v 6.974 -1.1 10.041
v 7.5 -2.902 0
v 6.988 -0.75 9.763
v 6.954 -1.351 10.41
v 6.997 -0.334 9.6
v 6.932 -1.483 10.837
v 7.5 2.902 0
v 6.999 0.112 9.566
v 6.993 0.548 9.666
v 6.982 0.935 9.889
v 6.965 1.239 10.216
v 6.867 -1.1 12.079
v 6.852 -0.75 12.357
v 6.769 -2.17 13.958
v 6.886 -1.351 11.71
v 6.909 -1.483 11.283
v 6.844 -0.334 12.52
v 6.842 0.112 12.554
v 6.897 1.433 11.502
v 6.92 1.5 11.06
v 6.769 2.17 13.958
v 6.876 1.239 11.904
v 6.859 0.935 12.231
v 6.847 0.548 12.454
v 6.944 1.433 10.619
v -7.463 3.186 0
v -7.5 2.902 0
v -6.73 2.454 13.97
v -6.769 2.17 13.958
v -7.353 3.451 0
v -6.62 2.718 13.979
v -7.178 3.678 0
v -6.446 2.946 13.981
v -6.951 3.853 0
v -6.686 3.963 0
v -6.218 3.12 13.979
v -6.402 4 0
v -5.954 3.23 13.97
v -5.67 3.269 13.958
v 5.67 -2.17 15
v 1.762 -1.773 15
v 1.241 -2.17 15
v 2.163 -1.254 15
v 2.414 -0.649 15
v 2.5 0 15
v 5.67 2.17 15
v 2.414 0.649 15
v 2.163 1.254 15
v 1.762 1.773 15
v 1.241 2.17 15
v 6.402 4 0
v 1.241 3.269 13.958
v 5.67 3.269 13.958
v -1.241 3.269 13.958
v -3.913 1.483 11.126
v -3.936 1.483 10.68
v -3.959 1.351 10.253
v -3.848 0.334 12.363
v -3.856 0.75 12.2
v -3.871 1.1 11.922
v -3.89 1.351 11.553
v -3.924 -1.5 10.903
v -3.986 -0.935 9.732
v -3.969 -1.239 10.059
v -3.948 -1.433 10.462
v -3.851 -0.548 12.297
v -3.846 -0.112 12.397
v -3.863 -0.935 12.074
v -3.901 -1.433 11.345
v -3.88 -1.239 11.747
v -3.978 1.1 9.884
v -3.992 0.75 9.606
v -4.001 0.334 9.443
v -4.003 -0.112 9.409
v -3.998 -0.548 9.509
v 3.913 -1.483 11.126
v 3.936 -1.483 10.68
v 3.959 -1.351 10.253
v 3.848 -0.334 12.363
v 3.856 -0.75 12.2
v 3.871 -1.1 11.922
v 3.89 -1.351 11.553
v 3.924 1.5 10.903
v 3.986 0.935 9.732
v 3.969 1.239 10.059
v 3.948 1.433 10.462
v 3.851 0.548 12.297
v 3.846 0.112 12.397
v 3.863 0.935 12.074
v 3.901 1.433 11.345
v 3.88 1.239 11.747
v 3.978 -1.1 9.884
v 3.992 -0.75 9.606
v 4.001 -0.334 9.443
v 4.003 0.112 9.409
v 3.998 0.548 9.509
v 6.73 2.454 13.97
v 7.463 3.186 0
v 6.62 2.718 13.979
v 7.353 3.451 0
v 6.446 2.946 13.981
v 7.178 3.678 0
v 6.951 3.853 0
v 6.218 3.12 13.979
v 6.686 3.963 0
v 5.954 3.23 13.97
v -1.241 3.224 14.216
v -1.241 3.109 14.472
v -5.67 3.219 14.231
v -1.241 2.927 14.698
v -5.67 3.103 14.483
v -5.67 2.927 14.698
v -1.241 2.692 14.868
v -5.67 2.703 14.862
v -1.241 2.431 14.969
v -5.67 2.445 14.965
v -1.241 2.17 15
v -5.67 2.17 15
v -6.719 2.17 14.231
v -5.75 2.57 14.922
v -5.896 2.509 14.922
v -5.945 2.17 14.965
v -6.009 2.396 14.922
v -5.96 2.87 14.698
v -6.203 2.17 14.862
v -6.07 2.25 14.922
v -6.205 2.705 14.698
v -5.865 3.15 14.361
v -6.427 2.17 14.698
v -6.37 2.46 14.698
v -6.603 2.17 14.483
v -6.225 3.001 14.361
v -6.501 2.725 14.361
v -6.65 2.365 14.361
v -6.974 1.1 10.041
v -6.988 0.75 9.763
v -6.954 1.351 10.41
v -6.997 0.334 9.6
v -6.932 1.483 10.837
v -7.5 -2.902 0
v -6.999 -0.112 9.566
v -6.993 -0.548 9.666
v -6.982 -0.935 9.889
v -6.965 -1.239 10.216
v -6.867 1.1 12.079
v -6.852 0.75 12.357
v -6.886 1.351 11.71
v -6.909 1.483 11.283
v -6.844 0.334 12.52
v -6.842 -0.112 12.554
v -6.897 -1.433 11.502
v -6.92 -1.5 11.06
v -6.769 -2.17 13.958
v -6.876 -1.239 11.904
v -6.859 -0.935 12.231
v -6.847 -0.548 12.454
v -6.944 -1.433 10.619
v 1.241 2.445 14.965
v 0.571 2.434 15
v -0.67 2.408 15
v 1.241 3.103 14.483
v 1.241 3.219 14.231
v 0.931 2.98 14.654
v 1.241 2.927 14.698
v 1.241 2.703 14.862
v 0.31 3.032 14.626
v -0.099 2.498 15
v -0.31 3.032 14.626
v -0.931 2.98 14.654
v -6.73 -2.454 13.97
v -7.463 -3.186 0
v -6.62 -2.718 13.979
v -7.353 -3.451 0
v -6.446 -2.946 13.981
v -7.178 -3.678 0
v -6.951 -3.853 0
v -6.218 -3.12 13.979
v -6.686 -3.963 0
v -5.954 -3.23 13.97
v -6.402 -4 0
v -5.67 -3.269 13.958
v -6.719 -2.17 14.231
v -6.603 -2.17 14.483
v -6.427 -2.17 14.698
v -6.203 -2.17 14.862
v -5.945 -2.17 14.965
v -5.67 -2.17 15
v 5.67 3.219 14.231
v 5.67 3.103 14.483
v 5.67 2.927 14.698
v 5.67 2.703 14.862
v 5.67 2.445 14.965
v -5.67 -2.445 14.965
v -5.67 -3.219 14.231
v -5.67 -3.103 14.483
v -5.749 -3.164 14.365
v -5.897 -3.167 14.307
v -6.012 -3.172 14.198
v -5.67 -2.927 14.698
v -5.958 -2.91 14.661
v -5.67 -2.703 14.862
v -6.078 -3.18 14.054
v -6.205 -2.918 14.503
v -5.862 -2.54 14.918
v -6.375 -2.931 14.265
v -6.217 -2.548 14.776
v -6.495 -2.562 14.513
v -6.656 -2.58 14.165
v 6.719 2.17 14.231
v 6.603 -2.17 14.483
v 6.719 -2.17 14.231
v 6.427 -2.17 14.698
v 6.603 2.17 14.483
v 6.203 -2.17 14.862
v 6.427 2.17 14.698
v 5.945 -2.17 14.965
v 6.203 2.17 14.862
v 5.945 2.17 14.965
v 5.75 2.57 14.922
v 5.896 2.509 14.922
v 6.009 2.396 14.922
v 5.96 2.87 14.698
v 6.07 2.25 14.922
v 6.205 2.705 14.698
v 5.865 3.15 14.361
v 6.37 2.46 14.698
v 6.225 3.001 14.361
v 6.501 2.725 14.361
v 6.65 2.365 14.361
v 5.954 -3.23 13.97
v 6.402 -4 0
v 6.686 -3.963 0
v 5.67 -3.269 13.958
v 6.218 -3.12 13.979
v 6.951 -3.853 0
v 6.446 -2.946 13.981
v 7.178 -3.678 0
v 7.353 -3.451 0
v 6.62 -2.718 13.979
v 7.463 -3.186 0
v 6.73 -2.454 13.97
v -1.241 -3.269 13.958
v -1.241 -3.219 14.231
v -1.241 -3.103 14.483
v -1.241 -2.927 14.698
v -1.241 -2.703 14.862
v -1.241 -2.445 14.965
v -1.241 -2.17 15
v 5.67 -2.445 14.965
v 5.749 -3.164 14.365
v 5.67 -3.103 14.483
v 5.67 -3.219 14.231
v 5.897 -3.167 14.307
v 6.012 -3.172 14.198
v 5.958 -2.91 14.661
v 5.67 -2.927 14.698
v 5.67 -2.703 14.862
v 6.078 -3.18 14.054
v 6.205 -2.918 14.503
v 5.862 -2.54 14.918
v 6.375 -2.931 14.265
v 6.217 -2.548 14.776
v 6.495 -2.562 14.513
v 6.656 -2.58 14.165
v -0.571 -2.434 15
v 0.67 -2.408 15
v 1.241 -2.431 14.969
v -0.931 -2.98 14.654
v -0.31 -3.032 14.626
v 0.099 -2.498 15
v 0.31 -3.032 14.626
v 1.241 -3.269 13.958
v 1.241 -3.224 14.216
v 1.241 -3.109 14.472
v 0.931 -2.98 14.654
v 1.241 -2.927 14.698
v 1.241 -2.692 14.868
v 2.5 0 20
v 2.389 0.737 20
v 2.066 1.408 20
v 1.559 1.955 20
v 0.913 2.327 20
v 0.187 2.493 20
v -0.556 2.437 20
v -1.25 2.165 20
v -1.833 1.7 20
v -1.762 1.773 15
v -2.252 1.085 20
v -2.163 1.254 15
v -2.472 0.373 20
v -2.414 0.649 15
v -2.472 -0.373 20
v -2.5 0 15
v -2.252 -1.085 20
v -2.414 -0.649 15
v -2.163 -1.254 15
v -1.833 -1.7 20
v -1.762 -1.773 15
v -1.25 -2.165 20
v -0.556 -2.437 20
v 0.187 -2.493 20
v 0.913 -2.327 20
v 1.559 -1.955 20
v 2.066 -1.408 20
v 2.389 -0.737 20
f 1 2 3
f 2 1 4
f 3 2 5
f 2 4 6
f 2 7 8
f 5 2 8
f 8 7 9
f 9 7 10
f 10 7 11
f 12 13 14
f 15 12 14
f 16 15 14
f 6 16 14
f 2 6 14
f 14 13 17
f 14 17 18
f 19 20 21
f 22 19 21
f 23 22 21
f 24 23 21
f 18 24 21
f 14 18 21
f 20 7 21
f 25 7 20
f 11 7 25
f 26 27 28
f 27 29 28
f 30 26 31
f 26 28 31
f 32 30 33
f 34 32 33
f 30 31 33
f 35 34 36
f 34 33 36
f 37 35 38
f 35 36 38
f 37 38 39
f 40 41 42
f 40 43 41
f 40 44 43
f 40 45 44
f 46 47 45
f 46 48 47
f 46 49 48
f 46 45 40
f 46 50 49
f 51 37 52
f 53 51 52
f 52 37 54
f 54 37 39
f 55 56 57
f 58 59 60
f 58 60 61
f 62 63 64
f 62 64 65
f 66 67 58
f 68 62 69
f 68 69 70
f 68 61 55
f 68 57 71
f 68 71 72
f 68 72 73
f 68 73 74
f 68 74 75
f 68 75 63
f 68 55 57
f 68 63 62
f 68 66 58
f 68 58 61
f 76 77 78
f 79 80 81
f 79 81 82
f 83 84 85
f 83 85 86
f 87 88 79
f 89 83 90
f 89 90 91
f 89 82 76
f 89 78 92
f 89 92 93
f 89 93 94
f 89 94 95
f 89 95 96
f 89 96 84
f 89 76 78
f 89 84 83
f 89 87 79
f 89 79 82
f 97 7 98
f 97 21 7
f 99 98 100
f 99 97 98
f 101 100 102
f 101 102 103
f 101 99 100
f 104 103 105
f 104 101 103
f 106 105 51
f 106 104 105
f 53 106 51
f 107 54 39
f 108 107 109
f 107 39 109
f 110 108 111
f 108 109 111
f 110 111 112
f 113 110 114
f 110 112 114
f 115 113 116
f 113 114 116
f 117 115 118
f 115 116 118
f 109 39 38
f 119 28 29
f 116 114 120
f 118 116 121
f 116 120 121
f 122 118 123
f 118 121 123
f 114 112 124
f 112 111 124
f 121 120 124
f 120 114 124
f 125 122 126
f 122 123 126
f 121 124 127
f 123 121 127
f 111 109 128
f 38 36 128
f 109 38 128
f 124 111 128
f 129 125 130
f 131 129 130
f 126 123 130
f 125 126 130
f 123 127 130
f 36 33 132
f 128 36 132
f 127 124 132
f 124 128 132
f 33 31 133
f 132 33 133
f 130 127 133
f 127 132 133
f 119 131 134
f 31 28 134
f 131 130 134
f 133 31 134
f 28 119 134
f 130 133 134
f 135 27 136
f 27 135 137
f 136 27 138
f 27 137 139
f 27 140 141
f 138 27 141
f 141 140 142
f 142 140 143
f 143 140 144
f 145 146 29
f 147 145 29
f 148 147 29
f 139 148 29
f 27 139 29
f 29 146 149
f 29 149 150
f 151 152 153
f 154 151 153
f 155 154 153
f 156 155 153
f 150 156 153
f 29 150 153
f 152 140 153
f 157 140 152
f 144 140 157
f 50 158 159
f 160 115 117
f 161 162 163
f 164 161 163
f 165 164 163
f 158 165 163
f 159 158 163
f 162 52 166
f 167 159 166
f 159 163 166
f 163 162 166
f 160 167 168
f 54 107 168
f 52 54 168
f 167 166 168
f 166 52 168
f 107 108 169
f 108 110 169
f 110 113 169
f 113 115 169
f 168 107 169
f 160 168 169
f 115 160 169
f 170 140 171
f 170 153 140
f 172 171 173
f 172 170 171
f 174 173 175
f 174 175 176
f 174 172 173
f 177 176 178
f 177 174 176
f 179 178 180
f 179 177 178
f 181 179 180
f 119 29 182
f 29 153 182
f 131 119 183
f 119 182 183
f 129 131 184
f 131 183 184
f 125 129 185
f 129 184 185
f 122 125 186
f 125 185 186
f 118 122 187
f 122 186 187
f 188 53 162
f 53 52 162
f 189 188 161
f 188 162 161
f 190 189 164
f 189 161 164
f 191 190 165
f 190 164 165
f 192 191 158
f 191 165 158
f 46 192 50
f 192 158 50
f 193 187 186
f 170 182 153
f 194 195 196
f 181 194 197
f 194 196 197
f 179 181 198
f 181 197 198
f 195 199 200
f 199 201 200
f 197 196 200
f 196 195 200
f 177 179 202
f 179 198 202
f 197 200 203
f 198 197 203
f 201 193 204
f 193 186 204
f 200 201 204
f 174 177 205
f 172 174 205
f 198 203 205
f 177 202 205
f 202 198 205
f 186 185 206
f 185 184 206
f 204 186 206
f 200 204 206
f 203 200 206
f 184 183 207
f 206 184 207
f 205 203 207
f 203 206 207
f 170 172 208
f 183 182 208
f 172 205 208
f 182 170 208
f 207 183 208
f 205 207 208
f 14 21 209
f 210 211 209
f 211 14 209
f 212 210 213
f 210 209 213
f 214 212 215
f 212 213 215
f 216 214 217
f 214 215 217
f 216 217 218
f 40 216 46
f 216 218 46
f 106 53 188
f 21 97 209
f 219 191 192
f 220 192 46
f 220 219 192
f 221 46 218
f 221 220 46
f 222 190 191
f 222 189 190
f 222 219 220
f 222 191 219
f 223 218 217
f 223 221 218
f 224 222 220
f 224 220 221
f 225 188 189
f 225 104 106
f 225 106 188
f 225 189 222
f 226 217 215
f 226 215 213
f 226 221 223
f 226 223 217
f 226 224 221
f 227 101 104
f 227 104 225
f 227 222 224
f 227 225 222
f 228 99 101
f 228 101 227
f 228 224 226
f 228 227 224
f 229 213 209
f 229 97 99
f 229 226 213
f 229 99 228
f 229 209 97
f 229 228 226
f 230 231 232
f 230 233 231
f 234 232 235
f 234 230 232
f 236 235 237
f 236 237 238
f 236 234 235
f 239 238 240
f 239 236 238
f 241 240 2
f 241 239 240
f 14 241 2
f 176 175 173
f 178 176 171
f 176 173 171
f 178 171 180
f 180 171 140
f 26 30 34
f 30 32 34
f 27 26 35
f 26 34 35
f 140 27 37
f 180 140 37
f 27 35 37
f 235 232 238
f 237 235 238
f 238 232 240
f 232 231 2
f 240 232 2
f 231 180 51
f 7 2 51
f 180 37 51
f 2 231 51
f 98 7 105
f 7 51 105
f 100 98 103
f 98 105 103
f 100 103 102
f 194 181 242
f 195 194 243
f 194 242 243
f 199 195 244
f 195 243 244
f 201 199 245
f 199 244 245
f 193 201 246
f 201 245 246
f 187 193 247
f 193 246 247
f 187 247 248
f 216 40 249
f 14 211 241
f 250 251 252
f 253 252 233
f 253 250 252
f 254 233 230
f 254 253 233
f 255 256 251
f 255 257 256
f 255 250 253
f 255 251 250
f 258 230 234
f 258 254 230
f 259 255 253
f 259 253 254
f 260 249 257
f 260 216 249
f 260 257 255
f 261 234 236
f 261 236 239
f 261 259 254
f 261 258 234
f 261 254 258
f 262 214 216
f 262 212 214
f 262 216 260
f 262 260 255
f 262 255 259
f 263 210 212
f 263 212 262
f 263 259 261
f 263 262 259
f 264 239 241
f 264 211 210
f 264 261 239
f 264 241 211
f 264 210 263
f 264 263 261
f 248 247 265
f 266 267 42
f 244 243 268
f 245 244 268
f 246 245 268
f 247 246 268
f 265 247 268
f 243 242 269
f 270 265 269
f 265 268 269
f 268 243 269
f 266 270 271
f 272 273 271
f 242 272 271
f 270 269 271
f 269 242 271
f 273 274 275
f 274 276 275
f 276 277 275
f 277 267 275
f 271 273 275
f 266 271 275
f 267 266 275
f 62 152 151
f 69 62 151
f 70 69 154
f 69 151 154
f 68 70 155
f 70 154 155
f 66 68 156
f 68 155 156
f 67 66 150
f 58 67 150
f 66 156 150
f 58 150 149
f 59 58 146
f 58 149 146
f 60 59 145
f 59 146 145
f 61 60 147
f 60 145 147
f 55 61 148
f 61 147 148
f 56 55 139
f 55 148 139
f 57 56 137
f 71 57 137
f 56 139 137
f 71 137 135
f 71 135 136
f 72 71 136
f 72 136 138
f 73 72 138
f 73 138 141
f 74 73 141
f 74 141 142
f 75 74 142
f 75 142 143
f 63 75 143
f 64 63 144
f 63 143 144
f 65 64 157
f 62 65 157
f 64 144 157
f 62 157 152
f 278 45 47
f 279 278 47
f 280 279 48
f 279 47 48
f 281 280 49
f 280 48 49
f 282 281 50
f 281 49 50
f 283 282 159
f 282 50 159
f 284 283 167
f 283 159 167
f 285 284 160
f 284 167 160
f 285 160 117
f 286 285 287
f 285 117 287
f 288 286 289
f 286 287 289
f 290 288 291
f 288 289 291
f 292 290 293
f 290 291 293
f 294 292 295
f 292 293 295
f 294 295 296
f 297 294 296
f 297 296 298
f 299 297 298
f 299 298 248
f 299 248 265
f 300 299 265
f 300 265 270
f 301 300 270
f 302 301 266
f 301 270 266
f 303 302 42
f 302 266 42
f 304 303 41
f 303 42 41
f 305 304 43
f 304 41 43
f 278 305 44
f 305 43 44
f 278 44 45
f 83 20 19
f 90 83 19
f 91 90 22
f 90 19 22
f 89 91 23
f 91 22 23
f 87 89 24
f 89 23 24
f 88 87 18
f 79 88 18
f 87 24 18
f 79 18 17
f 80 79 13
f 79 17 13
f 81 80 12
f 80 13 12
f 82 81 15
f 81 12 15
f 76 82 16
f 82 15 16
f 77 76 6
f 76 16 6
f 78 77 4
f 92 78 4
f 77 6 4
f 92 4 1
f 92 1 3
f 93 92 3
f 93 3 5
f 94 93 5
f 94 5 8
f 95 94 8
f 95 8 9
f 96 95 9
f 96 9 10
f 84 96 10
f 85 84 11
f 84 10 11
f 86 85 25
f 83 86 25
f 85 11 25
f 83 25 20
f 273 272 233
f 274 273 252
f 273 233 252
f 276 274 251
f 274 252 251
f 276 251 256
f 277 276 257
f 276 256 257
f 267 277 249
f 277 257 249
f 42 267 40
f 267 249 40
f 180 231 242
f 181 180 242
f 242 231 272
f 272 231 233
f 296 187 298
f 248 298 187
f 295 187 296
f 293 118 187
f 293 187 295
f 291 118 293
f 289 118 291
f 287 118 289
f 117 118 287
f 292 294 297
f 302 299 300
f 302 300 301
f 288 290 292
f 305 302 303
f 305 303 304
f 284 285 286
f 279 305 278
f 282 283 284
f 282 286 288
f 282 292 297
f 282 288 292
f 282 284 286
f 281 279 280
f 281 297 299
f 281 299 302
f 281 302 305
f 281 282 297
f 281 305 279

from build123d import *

# Parameters (mm, degrees)
F0_W     = 15
F0_H     = 8
F1_DEPTH = 15
F1_TAPER = 3
F2_R     = 2.5
F3_DEPTH = 5
F4_R     = 1.1
F5_R     = 1.5
F6_DEPTH = 3
F7_R     = 1.5
F8_DEPTH = 3


with BuildPart() as f1:
    # F0 (on Top) → F1 (new body)
    with BuildSketch(Plane.XY):
        Rectangle(F0_W, F0_H)
    extrude(amount=F1_DEPTH, taper=F1_TAPER)

    # F2 (on face) → F3 (join)
    with BuildSketch(Plane.XY.offset(15)):
        Circle(F2_R)
    extrude(amount=F3_DEPTH)

    # F4
    f4_edges = [f1.edges().sort_by_distance(p)[0] for p in [
        (7.106942, 3.606942, 7.5),
        (-7.106942, 3.606942, 7.5),
        (0, 3.213883, 15),
        (-6.713883, 0, 15),
        (6.713883, 0, 15),
        (0, -3.213883, 15),
        (7.106942, -3.606942, 7.5),
        (-7.106942, -3.606942, 7.5),
    ]]
    fillet(f4_edges, radius=F4_R)

    # F5 (on face) → F6 (cut)
    with BuildSketch(Plane(origin=(-7.4794571076, 0, 0.3919817373), x_dir=(0, -1, 0), z_dir=(-0.9986295348, 0, 0.0523359562))):
        with Locations((0, 10.682696983)):
            Circle(F5_R)
    extrude(amount=-F6_DEPTH, mode=Mode.SUBTRACT)

    # F7 (on face) → F8 (cut)
    with BuildSketch(Plane(origin=(7.4794571076, 0, 0.3919817373), x_dir=(0, 1, 0), z_dir=(0.9986295348, 0, 0.0523359562))):
        with Locations((0, 10.682696983)):
            Circle(F7_R)
    extrude(amount=-F8_DEPTH, mode=Mode.SUBTRACT)


solid = f1.part
